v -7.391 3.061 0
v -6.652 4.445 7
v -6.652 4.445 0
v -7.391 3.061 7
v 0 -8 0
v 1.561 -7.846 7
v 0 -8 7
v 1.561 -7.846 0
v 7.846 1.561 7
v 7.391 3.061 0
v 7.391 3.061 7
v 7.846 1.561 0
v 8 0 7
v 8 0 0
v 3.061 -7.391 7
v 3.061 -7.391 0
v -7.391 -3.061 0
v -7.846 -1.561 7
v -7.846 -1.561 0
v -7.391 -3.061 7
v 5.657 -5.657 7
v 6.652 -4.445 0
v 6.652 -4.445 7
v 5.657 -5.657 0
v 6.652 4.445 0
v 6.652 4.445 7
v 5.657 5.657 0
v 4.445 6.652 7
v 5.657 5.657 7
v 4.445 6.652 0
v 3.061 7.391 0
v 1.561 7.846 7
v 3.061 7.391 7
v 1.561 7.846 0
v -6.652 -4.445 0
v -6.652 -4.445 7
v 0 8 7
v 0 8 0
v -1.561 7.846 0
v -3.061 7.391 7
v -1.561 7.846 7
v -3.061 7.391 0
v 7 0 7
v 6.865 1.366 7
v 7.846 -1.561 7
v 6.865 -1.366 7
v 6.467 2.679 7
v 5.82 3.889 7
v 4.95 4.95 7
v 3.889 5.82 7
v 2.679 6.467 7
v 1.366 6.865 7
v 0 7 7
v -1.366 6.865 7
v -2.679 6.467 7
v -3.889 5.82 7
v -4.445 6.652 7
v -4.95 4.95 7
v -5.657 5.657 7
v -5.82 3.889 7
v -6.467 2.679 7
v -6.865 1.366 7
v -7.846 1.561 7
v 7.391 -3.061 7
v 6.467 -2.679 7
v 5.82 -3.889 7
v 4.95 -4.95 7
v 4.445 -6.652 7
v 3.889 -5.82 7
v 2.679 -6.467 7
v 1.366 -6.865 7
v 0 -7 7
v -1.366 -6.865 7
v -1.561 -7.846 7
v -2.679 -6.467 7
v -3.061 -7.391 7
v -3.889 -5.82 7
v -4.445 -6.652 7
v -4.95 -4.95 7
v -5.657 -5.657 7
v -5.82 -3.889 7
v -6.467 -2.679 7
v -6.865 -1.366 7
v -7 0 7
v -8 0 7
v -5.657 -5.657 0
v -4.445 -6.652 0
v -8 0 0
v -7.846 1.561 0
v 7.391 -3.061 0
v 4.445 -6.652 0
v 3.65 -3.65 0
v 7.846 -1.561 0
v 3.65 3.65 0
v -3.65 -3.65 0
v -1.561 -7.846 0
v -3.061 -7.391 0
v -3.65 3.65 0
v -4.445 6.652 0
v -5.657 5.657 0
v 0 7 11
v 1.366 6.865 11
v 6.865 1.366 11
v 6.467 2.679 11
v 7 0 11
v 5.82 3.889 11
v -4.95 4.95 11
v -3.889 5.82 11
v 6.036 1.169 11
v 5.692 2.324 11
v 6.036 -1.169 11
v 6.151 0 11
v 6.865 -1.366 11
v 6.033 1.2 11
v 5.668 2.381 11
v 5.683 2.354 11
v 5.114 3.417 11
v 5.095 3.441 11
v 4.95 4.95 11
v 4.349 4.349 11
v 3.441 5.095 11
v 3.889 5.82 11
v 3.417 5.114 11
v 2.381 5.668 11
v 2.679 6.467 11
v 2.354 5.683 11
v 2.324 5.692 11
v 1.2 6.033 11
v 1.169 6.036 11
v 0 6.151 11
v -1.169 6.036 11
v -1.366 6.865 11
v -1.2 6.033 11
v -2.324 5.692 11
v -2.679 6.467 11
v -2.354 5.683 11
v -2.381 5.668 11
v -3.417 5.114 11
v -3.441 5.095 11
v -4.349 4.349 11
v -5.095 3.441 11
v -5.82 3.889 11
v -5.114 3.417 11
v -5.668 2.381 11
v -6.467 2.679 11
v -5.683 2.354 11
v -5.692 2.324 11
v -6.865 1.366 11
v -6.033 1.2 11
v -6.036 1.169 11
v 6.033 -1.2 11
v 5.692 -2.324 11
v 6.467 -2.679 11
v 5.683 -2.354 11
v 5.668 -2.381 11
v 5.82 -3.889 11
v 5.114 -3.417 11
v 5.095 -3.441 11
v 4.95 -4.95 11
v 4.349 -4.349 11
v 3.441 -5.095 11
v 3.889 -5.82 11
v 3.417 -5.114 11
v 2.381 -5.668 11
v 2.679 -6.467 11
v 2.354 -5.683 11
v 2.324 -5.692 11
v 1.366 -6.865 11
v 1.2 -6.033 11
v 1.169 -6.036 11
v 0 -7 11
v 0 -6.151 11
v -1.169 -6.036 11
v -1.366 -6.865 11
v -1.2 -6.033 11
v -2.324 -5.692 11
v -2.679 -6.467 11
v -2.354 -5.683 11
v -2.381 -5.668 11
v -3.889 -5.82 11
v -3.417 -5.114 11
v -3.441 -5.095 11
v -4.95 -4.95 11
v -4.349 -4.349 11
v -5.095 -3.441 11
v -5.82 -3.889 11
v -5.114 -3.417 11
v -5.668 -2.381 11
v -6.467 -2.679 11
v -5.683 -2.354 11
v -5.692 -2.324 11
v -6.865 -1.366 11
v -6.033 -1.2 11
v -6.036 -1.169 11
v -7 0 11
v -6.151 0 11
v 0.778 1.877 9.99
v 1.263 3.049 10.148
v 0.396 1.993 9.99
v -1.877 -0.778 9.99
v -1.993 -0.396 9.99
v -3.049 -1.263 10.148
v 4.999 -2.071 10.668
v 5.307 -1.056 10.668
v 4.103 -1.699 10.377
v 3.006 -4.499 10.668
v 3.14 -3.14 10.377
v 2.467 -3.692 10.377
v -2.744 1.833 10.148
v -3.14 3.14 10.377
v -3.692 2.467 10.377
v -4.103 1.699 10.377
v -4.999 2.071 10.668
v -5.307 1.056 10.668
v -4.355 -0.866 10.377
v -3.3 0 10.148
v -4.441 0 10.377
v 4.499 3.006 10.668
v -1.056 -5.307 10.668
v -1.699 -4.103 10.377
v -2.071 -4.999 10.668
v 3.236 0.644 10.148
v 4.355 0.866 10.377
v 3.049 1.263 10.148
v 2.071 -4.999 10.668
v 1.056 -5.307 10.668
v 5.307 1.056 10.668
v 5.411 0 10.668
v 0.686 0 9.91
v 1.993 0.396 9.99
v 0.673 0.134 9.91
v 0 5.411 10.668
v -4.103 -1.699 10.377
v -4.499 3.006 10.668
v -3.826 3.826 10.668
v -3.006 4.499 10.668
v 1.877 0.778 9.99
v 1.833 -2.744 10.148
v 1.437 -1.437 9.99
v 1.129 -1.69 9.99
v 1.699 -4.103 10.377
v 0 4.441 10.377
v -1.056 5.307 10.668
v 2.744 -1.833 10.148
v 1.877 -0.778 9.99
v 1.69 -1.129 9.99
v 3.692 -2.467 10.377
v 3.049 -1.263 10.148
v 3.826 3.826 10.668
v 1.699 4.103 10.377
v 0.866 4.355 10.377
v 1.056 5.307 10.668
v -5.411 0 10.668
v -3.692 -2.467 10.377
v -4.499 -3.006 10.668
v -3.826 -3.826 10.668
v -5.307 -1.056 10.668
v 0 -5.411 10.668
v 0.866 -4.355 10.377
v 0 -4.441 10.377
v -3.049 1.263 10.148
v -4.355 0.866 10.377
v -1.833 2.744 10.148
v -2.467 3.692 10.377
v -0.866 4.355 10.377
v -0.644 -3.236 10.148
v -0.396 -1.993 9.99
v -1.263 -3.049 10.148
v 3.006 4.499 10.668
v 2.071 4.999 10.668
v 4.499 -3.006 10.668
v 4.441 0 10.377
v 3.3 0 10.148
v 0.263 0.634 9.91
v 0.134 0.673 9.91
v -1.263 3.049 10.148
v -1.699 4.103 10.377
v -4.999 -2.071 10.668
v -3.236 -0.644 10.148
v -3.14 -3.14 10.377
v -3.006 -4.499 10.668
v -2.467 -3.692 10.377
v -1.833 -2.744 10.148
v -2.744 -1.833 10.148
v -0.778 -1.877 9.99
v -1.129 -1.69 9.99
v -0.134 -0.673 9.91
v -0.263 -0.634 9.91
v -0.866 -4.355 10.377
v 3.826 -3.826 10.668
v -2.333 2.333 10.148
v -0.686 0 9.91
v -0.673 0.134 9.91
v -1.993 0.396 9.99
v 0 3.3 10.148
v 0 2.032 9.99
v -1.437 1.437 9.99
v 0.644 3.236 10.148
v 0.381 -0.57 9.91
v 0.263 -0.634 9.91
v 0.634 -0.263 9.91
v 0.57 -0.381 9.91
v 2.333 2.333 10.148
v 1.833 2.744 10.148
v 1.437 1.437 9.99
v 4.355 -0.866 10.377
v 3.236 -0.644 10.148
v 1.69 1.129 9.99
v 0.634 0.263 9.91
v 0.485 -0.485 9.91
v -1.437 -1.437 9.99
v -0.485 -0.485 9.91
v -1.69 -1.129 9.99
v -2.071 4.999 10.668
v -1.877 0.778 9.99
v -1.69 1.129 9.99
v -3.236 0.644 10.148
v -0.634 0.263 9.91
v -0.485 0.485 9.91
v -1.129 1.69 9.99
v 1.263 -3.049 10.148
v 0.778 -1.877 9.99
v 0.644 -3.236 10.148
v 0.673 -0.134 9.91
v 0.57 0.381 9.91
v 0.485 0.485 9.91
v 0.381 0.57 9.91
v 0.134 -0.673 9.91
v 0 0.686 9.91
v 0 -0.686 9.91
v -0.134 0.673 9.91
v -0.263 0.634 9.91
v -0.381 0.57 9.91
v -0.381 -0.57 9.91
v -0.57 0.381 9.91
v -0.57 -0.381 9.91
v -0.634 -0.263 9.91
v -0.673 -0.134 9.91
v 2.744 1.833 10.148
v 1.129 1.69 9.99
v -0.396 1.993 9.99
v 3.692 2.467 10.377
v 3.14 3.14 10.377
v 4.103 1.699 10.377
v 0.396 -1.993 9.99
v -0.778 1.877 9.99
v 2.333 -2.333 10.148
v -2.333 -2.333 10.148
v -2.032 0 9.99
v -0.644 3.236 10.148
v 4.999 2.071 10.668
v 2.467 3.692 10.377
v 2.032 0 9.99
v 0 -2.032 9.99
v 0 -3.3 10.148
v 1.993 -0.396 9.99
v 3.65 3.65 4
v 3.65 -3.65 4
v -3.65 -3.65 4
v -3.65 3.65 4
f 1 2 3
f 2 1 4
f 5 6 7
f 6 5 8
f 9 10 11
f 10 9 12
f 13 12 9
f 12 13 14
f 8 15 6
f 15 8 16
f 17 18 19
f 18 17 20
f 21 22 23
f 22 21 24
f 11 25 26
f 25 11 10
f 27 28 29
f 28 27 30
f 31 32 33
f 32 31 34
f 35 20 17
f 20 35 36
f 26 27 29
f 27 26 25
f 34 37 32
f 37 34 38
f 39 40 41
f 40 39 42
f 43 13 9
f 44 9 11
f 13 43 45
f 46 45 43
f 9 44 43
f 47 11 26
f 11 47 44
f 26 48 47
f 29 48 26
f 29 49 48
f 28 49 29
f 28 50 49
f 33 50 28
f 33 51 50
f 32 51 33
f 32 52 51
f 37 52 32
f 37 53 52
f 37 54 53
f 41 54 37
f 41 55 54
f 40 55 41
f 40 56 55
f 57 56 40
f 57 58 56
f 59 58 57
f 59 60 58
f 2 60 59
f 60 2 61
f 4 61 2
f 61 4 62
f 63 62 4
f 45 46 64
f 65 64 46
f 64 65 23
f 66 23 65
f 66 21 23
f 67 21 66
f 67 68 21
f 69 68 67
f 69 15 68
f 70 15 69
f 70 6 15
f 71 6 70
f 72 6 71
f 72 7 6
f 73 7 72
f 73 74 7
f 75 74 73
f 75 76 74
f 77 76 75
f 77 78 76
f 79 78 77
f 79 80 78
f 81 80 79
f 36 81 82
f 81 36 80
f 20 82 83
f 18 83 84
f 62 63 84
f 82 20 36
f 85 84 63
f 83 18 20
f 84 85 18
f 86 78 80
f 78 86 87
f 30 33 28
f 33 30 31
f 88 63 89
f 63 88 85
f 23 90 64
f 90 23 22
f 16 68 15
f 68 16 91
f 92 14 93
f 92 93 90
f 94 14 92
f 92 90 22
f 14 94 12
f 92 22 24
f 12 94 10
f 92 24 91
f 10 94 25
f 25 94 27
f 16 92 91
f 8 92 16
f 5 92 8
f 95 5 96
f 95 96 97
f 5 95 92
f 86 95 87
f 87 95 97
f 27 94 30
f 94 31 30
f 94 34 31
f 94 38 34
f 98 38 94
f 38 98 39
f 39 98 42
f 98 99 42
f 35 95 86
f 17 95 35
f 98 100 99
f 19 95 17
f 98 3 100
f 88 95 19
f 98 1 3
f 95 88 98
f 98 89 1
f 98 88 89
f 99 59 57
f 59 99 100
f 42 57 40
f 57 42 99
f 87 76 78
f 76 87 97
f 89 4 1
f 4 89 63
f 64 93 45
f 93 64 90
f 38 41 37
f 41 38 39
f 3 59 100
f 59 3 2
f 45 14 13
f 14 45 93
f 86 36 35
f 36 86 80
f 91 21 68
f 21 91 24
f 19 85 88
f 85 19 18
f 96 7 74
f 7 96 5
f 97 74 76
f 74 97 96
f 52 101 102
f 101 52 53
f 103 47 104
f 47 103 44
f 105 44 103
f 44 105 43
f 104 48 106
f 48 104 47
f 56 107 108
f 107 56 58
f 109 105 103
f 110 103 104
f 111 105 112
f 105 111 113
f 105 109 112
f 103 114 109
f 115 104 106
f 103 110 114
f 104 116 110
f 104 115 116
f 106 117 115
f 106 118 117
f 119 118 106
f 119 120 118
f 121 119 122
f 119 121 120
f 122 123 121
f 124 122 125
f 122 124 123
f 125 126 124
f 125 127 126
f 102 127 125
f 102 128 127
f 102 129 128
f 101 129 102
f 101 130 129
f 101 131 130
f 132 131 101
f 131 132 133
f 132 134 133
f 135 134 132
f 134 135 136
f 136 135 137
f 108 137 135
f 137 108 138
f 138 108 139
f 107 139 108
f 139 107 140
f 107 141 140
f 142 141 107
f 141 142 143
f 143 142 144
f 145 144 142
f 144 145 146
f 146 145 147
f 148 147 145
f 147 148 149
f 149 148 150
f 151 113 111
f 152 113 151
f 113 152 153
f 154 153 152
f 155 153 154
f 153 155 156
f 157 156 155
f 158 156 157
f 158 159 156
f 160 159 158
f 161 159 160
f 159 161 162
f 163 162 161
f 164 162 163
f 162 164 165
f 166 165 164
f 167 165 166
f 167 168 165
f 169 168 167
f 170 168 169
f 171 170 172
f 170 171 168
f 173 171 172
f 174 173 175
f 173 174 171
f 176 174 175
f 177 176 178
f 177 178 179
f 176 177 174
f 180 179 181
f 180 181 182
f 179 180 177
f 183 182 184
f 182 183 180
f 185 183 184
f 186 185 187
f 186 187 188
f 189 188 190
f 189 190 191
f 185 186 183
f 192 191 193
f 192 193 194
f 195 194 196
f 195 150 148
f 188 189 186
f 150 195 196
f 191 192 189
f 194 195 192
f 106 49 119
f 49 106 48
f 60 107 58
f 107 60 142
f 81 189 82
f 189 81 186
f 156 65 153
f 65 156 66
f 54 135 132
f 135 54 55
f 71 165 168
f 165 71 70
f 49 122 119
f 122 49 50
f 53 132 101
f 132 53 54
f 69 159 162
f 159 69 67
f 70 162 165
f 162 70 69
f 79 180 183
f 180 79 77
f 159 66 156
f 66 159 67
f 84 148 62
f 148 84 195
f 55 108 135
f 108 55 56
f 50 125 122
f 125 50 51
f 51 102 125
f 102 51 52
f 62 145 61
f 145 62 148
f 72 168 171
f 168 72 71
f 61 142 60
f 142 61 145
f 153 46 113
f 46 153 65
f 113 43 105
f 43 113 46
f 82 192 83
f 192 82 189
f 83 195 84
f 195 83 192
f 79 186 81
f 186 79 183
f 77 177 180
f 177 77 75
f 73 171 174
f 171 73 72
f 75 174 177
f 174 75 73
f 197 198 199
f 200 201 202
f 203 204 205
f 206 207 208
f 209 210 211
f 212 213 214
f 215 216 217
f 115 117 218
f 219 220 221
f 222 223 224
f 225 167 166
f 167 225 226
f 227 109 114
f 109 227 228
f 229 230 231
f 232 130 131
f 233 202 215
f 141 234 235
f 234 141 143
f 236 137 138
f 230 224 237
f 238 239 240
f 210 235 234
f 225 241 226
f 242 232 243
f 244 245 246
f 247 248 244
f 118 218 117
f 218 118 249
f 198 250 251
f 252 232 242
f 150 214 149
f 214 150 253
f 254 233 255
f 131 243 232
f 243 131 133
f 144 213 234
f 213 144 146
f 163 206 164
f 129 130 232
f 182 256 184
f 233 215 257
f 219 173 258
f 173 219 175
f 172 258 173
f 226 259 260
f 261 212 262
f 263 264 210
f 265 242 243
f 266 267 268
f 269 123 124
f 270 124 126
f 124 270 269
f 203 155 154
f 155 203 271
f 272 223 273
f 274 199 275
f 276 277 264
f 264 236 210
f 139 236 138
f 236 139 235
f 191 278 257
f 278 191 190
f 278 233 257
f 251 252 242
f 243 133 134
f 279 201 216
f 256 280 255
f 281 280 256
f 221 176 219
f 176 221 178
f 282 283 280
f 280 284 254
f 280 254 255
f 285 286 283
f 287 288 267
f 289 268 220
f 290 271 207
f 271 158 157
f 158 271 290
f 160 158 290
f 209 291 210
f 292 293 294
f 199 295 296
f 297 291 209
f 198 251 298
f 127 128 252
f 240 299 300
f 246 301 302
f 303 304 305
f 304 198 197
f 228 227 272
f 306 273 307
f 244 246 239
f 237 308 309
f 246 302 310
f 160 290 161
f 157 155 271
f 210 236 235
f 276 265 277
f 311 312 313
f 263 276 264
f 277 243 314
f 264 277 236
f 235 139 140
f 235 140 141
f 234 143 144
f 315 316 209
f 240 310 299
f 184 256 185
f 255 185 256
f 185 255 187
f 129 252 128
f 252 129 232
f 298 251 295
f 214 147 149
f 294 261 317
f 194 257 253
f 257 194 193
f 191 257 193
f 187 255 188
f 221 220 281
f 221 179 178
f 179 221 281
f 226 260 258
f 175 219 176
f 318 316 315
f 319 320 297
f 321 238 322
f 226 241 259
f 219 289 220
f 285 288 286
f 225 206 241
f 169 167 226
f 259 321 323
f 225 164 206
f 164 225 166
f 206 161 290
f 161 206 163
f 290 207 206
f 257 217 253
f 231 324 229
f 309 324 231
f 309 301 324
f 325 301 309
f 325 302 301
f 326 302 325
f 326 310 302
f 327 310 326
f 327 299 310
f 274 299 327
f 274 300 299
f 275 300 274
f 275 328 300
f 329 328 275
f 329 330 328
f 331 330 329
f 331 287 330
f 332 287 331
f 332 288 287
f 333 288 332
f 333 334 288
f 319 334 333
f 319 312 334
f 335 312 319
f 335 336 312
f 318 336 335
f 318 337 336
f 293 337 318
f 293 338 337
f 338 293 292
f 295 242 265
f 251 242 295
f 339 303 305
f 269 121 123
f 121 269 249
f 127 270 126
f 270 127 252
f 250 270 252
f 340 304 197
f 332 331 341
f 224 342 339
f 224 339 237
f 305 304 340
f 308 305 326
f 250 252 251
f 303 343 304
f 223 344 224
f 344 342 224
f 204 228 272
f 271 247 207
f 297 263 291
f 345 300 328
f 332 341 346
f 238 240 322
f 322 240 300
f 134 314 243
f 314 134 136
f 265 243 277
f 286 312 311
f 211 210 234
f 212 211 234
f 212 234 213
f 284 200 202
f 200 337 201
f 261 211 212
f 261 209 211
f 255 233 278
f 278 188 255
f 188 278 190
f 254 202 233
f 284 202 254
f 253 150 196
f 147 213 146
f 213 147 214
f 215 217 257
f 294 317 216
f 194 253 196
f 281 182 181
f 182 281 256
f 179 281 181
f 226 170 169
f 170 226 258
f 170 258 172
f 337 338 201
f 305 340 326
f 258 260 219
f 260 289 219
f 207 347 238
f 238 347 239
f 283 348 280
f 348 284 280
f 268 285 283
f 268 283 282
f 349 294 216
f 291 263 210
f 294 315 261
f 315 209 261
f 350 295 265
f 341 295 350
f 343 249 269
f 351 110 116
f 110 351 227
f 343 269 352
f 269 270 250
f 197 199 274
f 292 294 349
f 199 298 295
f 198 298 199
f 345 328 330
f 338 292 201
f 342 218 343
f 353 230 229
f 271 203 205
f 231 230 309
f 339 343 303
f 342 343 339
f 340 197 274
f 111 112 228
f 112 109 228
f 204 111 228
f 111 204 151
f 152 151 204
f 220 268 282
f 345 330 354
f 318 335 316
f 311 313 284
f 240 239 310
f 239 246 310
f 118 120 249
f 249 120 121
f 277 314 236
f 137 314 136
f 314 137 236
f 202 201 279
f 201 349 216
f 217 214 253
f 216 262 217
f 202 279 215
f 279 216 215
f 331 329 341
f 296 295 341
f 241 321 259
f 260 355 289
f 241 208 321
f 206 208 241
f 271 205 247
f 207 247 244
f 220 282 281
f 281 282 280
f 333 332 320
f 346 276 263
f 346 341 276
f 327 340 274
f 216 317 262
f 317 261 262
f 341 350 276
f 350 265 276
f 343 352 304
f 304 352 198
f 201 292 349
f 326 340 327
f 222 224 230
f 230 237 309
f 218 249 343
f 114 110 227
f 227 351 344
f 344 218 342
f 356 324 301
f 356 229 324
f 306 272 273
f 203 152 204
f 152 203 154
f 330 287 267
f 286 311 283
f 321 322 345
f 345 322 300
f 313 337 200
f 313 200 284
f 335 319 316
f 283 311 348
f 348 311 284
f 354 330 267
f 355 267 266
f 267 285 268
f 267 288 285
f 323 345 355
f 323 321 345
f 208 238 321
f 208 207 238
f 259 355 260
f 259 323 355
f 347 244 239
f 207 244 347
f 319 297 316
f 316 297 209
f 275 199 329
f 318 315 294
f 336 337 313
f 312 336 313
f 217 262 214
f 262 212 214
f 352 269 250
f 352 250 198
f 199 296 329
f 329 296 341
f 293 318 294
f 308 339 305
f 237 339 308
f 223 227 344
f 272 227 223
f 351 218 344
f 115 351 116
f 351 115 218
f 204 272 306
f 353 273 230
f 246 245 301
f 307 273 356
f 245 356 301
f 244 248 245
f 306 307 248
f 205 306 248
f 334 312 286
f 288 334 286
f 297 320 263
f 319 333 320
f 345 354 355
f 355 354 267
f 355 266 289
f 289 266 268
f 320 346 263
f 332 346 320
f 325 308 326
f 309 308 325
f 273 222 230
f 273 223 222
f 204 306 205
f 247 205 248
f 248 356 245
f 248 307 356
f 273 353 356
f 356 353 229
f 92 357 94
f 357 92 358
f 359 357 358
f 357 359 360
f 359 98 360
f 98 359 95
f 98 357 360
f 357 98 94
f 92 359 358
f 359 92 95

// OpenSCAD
// file: parameter.scad
nStrings=6;
nFrets=24;
nLedFrets=16;
m5Dia=5.3;
m5HeadZ=3.5;
m4Dia=4.3;
m4NutDia=8.3;
m4NutZ=3.5;
m4HeadZ=2.5;
m3Dia=3.3;
m3NutDia=6.6;
m3NutZ=2.5;
m3HeadZ=2;
strDistN=7;
strDistB=10.25;
scale=645;
neckSlotY=500;

slotXY=15;

bodySlotX=115;
bodySlotY=250;

jackYA=40;
jackYB=54;
jackZA=20;
jackZB=25;

bodyX=300;

bodyZ=40;

strDia=[1.7,1.4,1.1,0.7,0.5,0.35];

fretStrPlus=4;
fretLN=strDistN*(nStrings-1)+fretStrPlus*2;
fretLB=strDistB*(nStrings-1)+fretStrPlus*2;
strSpanB=strDistB*(nStrings-1);
strSpanN=strDistN*(nStrings-1);
fretBtmZ=1;
neckSlotX=fretLN;
neckSlotDist=neckSlotX-slotXY*2;

neck_sideT=5.5; //thicknes of the neck side locks
neck_bottomT=2.5;

neck_mntPosYA=447;
neck_mntPosYB=420;
neck_mntEndT=2.5;
neck_lastFretSpc=13;

nut_slotSink=6;

//fretY=16;
fretPcbZ=1.6;
fretDia=3.5;
fretZ=1.5;
fretOvrZ=4;
fretboardZ=fretOvrZ+fretPcbZ;



L=scale;
k=1.05946;

fretPos1=scale-(scale/pow(k,4));

function fretPos(i)=L-(L/pow(k,i));
function fretSpc(i)=(L/pow(k,i))-(L/pow(k,i+1));
function strSpc(i)=i/L*strDistB+(1-i/L)*strDistN;
function fretL(i)=(i/L*strDistB+(1-i/L)*strDistN)*(nStrings-1)+fretStrPlus*2;

echo (70-(fretL(fretPos(1))));
// main file
include <parameter.scad>

//spacer(6.3); //fader:8 rotary switches:9.3
//joyButton();
button(8); //
//dispFrame();
//sixRotEnc();

module spacer(h){
    $fn=16;
    dO=6;
    dI=3.3;
    difference(){
        cylinder(d=dO,h=h);
        cylinder(d=dI,h=h);
    }
}

module joyButton(){
 
    $fn=32;
    dA=8;
    dAi=4.2;
    dAiB=3.2;
    dB=18;
    moldScale=0.3;
    moldZOff=1;
    
    zA=6;
    zAi=3.5;
    zB=2.5;
    
    difference(){
        union(){
            cylinder(d=dA,h=zA);
            translate([0,0,zA])cylinder(d=dB,h=zB);
        }
        difference(){
            cylinder(d=dAi,h=zAi);
            translate([dAi-(dAi-dAiB)/2,0,0])cube([dAi,dAi,zAi*2],center=true);
            translate([-dAi+(dAi-dAiB)/2,0,0])cube([dAi,dAi,zAi*2],center=true);
        }    
        translate([0,0,zA+zB+moldZOff])scale([1,1,moldScale])sphere(d=dB);
    }
}

module button(space){
    //space=7;
    swH=5;
    hub=1;
    $fn=32;
    dI=7.3;
    dOA=16;
    dOB=14;
    
    zI=swH-hub;
    zA=space-hub;
    zB=4;
    
    moldScale=0.3;
    moldZOff=1;
    
    difference(){
        union(){
            cylinder(d=dOA,h=zA);
            cylinder(d=dOB,h=zA+zB);
        }
        translate([0,0,zA+zB+moldZOff])scale([1,1,moldScale])sphere(d=dOB);
        cube([dI,dI,zI*2],center=true);
    }
}

module dispFrame(){
    xO=40;
    yO=35;
    
    xI=33;
    yI=28;
    
    iOffY=2;
    
    fW=4; //width of the frame
    
    hA=1.5; //height of the frame on surface
    hB=4;
    
    difference(){
        union(){
            rcube([xO+fW*2,yO+fW*2,hA],2);
            translate([0,0,hA])rcube([xO,yO,hB],2);
        }
        hull(){
            translate([0,0,0])rcube([xO,yO,0.6],2);
            translate([0,0,hA+hB-0.7])rcube([xI,yI,0.1],2);
        }
        translate([0,0,hA+hB-0.6])rcube([xI,yI,0.6],2);
    }
}

module sixRotEnc(){
    strings=6;
    spacing=70;
    screwDia=4.4;
    centY=10;
    rotD=7.5;
    y=30;
    h=2.5;
    difference(){
        translate([0,0,0])rcube([bodySlotX,y,h],3);
        translate([-spacing/2,0,0]){
            for(x=[0:strings-1]){
                translate([x*(spacing/(strings-1)),0,0]){
                    translate([0,-y/2+centY,0])cylinder(d=rotD,h=h+1);
                    //cylinder(d=screwTdia,h=tZ);
                }
            }
        }
        translate([-bodySlotX/2+slotXY/2,0,0])cylinder(d=screwDia,h=h+1);
        translate([bodySlotX/2-slotXY/2,0,0])cylinder(d=screwDia,h=h+1);
    }
}


module spacerDisp(){
}

module rcube(size,radius){
$fn=32;
linear_extrude(height=size[2])
if(radius>0){
hull()
{
    // place 4 circles in the corners, with the given radius
    translate([(-size[0]/2)+(radius), (-size[1]/2)+(radius), 0])
    circle(r=radius);

    translate([(size[0]/2)-(radius), (-size[1]/2)+(radius), 0])
    circle(r=radius);

    translate([(-size[0]/2)+(radius), (size[1]/2)-(radius), 0])
    circle(r=radius);

    translate([(size[0]/2)-(radius), (size[1]/2)-(radius), 0])
    circle(r=radius);
}
}
if(radius==0){
translate([0,0,size[2]/2])cube(size,center=true);
}
}
